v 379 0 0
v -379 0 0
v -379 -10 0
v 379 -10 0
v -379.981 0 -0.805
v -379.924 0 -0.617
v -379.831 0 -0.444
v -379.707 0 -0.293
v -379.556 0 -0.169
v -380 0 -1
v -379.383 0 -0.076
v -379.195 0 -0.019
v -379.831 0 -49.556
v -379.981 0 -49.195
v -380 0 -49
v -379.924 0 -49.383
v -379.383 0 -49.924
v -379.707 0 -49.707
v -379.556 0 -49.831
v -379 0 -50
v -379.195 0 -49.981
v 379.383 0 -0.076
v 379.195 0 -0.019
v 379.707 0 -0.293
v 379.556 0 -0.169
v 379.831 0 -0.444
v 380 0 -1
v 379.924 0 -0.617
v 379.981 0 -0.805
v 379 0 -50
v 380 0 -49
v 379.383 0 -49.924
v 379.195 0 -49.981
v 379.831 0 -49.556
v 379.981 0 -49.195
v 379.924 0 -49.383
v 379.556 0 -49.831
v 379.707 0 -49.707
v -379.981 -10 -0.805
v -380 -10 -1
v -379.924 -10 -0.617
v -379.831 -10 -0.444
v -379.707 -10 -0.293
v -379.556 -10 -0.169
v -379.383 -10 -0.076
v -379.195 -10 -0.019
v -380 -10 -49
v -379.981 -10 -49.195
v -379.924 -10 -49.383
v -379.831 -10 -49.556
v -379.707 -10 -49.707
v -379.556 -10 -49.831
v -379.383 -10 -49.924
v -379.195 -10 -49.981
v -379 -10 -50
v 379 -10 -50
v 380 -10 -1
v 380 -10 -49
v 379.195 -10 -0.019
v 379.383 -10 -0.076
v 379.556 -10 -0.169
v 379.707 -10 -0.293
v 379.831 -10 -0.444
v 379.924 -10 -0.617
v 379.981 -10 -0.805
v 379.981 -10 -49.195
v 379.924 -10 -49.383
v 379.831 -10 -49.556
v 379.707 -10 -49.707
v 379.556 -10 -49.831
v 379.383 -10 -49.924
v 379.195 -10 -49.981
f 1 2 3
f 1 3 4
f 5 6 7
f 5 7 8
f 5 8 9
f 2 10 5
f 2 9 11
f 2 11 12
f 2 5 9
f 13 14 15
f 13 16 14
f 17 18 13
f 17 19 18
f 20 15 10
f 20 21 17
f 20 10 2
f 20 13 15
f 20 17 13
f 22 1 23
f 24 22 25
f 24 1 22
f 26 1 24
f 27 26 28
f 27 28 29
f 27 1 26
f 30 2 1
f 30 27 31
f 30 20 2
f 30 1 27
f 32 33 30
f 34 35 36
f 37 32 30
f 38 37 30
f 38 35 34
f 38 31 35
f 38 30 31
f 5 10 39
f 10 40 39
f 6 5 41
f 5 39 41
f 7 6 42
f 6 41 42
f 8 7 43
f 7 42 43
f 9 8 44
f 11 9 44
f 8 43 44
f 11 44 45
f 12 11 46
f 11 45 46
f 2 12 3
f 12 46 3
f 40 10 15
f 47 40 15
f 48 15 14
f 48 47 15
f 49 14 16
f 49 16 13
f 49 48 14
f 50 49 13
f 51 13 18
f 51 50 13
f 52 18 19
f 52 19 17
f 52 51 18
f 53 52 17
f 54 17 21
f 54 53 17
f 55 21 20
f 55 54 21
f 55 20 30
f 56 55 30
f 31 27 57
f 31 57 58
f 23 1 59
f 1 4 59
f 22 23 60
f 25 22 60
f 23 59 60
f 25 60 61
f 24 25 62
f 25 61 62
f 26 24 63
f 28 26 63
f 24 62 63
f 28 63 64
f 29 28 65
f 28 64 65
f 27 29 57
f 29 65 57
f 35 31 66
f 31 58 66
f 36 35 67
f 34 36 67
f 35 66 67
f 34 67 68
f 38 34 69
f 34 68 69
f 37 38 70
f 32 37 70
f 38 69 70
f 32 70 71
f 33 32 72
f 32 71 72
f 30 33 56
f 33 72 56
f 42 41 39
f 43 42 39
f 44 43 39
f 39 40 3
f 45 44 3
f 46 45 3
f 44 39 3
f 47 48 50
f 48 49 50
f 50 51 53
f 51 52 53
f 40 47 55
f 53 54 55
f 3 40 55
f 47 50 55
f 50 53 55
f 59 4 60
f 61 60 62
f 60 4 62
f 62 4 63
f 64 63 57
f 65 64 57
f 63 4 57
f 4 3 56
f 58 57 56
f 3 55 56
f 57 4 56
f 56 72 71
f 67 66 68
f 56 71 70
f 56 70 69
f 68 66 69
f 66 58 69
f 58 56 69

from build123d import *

# Parameters (mm, degrees)
SKETCH1_W          = 760
SKETCH1_H          = 50
BASE_FLANGE1_DEPTH = 10
FILLET_1_0_R       = 1


# Sheet-metal steps are written as plain solids
with BuildPart() as part:
    # Sketch1 → Base-Flange1 (new body)
    with BuildSketch(Plane(origin=(0, 0, 0), x_dir=(1, 0, 0), z_dir=(0, 1, 0))):
        with Locations((0, 25)):
            Rectangle(SKETCH1_W, SKETCH1_H)
    extrude(amount=-BASE_FLANGE1_DEPTH)

    # Fillet-1.0
    fillet_1_0_edges = [part.edges().sort_by_distance(p)[0] for p in [
        (-380, -5, -50),
        (380, -5, -50),
        (380, -5, 0),
        (-380, -5, 0),
    ]]
    fillet(fillet_1_0_edges, radius=FILLET_1_0_R)


solid = part.part
